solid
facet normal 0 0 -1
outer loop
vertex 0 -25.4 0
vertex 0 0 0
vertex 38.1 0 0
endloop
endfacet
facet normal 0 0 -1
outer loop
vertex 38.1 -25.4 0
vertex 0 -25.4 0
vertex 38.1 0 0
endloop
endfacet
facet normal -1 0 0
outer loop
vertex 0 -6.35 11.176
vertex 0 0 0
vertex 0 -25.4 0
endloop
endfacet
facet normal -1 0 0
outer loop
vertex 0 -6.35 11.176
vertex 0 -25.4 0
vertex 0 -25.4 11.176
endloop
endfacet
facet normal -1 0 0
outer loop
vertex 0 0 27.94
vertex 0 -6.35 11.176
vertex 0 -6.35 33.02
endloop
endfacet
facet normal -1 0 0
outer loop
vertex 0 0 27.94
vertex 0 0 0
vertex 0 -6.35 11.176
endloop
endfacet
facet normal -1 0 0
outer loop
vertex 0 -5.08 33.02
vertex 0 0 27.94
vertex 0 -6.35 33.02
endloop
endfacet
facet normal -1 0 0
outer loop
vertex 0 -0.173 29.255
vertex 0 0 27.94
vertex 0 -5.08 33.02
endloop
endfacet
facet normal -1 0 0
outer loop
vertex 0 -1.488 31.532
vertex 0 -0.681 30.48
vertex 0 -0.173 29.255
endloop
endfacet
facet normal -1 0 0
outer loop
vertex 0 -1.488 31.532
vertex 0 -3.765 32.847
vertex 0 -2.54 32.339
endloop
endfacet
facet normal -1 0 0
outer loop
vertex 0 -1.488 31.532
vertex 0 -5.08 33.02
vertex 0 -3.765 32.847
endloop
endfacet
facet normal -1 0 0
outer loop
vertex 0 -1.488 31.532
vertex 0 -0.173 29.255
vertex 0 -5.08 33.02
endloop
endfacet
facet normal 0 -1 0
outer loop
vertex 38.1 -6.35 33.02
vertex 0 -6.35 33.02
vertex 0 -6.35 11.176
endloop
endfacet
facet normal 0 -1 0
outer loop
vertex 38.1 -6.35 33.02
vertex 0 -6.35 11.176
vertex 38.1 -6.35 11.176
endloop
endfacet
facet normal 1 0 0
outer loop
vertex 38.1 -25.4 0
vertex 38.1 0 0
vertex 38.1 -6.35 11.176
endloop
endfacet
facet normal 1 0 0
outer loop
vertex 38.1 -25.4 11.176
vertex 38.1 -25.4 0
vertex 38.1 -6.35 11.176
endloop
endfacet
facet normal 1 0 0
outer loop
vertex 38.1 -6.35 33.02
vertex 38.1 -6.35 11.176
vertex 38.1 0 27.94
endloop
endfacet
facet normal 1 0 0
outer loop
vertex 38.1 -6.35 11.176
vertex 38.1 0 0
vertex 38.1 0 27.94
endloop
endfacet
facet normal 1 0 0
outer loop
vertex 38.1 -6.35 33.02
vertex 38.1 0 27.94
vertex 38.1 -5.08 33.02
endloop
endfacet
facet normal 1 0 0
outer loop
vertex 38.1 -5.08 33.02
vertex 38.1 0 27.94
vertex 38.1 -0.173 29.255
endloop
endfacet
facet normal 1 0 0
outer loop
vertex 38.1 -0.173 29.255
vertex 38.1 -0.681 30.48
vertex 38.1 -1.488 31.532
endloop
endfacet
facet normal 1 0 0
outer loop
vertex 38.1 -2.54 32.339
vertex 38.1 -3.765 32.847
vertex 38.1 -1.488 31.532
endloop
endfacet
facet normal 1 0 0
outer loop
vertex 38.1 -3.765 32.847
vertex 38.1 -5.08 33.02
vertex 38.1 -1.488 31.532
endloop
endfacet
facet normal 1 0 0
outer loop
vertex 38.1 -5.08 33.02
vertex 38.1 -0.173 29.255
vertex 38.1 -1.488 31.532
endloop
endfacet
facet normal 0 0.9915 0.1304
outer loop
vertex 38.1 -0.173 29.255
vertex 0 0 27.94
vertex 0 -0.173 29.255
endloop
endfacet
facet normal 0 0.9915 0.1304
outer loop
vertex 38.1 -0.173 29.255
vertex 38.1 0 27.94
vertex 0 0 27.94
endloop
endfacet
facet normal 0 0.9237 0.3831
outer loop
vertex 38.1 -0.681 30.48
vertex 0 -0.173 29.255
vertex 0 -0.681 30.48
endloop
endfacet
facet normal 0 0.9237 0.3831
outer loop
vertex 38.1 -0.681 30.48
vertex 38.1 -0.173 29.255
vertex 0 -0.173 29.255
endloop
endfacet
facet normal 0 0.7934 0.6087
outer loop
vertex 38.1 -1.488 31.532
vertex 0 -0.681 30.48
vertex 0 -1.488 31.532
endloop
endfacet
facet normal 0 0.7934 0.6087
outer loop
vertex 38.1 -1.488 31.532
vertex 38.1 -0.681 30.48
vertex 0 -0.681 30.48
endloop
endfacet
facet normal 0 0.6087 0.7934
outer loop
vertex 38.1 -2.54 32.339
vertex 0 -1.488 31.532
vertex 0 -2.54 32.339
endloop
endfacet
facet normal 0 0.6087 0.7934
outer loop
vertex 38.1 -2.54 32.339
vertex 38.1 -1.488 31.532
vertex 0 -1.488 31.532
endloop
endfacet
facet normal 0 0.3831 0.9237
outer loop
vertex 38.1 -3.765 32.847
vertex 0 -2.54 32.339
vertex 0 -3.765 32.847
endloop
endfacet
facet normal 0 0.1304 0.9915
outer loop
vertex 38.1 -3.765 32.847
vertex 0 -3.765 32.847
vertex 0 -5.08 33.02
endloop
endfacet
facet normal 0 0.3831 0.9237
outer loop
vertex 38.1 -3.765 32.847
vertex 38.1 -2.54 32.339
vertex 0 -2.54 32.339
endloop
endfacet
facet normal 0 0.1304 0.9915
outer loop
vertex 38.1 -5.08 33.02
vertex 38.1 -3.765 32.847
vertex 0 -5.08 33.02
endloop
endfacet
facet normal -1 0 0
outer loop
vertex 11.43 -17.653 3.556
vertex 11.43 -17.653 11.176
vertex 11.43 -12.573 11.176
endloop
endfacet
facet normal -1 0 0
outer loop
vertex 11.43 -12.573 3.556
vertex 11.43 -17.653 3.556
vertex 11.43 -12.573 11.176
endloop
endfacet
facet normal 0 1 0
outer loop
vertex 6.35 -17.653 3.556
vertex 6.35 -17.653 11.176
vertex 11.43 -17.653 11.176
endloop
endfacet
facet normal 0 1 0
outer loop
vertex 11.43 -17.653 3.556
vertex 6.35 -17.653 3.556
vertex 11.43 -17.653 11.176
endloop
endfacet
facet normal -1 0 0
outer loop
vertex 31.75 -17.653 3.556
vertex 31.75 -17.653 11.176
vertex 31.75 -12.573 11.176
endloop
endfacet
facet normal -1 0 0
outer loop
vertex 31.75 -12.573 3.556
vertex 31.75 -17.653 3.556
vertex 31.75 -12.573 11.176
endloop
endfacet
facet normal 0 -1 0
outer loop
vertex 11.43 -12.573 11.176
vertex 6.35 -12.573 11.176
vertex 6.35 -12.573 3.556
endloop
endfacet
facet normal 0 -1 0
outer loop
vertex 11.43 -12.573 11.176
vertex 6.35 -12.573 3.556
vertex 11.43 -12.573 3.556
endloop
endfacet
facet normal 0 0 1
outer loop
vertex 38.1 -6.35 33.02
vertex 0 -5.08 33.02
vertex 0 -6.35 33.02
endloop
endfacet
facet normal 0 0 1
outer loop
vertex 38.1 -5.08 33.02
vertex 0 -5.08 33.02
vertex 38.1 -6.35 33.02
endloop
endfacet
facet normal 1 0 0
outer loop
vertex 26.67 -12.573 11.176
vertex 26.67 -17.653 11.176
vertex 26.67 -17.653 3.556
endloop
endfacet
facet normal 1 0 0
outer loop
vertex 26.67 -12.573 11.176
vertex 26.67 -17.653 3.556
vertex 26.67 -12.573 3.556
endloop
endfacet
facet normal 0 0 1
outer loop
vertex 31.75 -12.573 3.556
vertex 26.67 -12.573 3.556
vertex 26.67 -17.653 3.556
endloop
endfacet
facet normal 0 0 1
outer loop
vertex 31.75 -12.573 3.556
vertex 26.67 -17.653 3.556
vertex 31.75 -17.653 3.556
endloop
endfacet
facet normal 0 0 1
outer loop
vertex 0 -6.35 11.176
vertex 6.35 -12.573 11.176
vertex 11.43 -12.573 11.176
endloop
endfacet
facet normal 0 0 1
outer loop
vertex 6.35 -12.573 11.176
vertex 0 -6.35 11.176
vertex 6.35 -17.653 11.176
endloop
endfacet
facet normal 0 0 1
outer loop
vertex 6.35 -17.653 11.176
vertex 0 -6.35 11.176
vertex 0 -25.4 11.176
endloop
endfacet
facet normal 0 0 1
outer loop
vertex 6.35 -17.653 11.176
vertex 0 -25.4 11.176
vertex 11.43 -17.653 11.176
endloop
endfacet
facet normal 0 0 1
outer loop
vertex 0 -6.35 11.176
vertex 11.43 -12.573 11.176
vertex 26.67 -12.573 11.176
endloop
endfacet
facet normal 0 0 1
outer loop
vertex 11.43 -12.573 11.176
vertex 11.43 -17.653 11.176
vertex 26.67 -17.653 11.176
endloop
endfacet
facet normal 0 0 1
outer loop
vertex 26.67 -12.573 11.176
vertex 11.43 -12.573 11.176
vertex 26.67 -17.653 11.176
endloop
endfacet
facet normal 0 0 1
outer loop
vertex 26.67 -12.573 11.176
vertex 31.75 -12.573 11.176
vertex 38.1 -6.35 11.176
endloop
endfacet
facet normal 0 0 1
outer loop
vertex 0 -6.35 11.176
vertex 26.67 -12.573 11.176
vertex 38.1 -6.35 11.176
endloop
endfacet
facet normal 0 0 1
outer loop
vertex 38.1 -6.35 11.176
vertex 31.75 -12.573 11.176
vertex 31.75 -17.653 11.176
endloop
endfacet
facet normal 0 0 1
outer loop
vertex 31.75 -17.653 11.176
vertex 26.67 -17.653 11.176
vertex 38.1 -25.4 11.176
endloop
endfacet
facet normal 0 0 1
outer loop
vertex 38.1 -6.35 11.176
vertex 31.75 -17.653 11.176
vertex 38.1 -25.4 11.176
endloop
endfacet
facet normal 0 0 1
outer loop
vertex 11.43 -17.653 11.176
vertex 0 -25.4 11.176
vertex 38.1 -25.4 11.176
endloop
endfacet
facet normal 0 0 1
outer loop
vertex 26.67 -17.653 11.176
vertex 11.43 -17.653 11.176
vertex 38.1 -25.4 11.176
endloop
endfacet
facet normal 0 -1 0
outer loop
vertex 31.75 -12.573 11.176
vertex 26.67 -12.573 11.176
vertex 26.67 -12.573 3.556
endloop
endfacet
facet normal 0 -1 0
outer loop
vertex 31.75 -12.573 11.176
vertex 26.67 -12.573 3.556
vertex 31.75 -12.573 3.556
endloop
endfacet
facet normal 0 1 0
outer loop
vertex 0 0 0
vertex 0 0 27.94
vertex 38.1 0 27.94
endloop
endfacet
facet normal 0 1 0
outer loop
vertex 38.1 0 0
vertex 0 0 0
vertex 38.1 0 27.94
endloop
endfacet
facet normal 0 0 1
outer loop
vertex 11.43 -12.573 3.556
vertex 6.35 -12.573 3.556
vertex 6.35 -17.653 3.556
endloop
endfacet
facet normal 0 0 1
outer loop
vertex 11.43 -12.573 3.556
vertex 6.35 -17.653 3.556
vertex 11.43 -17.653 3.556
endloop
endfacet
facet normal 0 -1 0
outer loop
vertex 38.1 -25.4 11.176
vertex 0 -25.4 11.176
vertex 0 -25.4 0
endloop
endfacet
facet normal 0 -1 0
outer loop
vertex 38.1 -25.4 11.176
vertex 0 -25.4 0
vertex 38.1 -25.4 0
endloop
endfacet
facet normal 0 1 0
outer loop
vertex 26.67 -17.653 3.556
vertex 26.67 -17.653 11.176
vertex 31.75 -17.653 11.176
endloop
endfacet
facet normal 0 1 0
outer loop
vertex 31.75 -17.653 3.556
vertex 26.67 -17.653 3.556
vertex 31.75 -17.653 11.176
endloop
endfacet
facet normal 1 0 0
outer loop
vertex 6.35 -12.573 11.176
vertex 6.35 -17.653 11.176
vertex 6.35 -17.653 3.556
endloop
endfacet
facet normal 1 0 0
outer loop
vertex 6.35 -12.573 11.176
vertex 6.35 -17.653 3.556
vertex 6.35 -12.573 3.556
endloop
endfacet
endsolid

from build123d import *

# Parameters (mm, degrees)
F0_W     = 38.1
F0_H     = 33.02
F1_DEPTH = 25.4
F2_W     = 38.1
F2_H     = 21.844
F3_DEPTH = 19.05
F4_W     = 5.08
F4_H     = 5.08
F5_DEPTH = 7.62
F6_R     = 5.08


with BuildPart() as f1:
    # F0 (on Front) → F1 (new body)
    with BuildSketch(Plane.XZ):
        with Locations((19.05, 16.51)):
            Rectangle(F0_W, F0_H)
    extrude(amount=F1_DEPTH)

    # F2 (on face) → F3 (cut)
    with BuildSketch(Plane.XZ.offset(25.4)):
        with Locations((19.05, 22.098)):
            Rectangle(F2_W, F2_H)
    extrude(amount=-F3_DEPTH, mode=Mode.SUBTRACT)

    # F4 (on face) → F5 (cut)
    with BuildSketch(Plane.XY.offset(11.176)):
        with Locations((8.89, -15.113)):
            Rectangle(F4_W, F4_H)
        with Locations((29.21, -15.113)):
            Rectangle(F4_W, F4_H)
    extrude(amount=-F5_DEPTH, mode=Mode.SUBTRACT)

    # F6
    f6_edges = [f1.edges().sort_by_distance(p)[0] for p in [
        (19.05, 0, 33.02),
    ]]
    fillet(f6_edges, radius=F6_R)


solid = f1.part
